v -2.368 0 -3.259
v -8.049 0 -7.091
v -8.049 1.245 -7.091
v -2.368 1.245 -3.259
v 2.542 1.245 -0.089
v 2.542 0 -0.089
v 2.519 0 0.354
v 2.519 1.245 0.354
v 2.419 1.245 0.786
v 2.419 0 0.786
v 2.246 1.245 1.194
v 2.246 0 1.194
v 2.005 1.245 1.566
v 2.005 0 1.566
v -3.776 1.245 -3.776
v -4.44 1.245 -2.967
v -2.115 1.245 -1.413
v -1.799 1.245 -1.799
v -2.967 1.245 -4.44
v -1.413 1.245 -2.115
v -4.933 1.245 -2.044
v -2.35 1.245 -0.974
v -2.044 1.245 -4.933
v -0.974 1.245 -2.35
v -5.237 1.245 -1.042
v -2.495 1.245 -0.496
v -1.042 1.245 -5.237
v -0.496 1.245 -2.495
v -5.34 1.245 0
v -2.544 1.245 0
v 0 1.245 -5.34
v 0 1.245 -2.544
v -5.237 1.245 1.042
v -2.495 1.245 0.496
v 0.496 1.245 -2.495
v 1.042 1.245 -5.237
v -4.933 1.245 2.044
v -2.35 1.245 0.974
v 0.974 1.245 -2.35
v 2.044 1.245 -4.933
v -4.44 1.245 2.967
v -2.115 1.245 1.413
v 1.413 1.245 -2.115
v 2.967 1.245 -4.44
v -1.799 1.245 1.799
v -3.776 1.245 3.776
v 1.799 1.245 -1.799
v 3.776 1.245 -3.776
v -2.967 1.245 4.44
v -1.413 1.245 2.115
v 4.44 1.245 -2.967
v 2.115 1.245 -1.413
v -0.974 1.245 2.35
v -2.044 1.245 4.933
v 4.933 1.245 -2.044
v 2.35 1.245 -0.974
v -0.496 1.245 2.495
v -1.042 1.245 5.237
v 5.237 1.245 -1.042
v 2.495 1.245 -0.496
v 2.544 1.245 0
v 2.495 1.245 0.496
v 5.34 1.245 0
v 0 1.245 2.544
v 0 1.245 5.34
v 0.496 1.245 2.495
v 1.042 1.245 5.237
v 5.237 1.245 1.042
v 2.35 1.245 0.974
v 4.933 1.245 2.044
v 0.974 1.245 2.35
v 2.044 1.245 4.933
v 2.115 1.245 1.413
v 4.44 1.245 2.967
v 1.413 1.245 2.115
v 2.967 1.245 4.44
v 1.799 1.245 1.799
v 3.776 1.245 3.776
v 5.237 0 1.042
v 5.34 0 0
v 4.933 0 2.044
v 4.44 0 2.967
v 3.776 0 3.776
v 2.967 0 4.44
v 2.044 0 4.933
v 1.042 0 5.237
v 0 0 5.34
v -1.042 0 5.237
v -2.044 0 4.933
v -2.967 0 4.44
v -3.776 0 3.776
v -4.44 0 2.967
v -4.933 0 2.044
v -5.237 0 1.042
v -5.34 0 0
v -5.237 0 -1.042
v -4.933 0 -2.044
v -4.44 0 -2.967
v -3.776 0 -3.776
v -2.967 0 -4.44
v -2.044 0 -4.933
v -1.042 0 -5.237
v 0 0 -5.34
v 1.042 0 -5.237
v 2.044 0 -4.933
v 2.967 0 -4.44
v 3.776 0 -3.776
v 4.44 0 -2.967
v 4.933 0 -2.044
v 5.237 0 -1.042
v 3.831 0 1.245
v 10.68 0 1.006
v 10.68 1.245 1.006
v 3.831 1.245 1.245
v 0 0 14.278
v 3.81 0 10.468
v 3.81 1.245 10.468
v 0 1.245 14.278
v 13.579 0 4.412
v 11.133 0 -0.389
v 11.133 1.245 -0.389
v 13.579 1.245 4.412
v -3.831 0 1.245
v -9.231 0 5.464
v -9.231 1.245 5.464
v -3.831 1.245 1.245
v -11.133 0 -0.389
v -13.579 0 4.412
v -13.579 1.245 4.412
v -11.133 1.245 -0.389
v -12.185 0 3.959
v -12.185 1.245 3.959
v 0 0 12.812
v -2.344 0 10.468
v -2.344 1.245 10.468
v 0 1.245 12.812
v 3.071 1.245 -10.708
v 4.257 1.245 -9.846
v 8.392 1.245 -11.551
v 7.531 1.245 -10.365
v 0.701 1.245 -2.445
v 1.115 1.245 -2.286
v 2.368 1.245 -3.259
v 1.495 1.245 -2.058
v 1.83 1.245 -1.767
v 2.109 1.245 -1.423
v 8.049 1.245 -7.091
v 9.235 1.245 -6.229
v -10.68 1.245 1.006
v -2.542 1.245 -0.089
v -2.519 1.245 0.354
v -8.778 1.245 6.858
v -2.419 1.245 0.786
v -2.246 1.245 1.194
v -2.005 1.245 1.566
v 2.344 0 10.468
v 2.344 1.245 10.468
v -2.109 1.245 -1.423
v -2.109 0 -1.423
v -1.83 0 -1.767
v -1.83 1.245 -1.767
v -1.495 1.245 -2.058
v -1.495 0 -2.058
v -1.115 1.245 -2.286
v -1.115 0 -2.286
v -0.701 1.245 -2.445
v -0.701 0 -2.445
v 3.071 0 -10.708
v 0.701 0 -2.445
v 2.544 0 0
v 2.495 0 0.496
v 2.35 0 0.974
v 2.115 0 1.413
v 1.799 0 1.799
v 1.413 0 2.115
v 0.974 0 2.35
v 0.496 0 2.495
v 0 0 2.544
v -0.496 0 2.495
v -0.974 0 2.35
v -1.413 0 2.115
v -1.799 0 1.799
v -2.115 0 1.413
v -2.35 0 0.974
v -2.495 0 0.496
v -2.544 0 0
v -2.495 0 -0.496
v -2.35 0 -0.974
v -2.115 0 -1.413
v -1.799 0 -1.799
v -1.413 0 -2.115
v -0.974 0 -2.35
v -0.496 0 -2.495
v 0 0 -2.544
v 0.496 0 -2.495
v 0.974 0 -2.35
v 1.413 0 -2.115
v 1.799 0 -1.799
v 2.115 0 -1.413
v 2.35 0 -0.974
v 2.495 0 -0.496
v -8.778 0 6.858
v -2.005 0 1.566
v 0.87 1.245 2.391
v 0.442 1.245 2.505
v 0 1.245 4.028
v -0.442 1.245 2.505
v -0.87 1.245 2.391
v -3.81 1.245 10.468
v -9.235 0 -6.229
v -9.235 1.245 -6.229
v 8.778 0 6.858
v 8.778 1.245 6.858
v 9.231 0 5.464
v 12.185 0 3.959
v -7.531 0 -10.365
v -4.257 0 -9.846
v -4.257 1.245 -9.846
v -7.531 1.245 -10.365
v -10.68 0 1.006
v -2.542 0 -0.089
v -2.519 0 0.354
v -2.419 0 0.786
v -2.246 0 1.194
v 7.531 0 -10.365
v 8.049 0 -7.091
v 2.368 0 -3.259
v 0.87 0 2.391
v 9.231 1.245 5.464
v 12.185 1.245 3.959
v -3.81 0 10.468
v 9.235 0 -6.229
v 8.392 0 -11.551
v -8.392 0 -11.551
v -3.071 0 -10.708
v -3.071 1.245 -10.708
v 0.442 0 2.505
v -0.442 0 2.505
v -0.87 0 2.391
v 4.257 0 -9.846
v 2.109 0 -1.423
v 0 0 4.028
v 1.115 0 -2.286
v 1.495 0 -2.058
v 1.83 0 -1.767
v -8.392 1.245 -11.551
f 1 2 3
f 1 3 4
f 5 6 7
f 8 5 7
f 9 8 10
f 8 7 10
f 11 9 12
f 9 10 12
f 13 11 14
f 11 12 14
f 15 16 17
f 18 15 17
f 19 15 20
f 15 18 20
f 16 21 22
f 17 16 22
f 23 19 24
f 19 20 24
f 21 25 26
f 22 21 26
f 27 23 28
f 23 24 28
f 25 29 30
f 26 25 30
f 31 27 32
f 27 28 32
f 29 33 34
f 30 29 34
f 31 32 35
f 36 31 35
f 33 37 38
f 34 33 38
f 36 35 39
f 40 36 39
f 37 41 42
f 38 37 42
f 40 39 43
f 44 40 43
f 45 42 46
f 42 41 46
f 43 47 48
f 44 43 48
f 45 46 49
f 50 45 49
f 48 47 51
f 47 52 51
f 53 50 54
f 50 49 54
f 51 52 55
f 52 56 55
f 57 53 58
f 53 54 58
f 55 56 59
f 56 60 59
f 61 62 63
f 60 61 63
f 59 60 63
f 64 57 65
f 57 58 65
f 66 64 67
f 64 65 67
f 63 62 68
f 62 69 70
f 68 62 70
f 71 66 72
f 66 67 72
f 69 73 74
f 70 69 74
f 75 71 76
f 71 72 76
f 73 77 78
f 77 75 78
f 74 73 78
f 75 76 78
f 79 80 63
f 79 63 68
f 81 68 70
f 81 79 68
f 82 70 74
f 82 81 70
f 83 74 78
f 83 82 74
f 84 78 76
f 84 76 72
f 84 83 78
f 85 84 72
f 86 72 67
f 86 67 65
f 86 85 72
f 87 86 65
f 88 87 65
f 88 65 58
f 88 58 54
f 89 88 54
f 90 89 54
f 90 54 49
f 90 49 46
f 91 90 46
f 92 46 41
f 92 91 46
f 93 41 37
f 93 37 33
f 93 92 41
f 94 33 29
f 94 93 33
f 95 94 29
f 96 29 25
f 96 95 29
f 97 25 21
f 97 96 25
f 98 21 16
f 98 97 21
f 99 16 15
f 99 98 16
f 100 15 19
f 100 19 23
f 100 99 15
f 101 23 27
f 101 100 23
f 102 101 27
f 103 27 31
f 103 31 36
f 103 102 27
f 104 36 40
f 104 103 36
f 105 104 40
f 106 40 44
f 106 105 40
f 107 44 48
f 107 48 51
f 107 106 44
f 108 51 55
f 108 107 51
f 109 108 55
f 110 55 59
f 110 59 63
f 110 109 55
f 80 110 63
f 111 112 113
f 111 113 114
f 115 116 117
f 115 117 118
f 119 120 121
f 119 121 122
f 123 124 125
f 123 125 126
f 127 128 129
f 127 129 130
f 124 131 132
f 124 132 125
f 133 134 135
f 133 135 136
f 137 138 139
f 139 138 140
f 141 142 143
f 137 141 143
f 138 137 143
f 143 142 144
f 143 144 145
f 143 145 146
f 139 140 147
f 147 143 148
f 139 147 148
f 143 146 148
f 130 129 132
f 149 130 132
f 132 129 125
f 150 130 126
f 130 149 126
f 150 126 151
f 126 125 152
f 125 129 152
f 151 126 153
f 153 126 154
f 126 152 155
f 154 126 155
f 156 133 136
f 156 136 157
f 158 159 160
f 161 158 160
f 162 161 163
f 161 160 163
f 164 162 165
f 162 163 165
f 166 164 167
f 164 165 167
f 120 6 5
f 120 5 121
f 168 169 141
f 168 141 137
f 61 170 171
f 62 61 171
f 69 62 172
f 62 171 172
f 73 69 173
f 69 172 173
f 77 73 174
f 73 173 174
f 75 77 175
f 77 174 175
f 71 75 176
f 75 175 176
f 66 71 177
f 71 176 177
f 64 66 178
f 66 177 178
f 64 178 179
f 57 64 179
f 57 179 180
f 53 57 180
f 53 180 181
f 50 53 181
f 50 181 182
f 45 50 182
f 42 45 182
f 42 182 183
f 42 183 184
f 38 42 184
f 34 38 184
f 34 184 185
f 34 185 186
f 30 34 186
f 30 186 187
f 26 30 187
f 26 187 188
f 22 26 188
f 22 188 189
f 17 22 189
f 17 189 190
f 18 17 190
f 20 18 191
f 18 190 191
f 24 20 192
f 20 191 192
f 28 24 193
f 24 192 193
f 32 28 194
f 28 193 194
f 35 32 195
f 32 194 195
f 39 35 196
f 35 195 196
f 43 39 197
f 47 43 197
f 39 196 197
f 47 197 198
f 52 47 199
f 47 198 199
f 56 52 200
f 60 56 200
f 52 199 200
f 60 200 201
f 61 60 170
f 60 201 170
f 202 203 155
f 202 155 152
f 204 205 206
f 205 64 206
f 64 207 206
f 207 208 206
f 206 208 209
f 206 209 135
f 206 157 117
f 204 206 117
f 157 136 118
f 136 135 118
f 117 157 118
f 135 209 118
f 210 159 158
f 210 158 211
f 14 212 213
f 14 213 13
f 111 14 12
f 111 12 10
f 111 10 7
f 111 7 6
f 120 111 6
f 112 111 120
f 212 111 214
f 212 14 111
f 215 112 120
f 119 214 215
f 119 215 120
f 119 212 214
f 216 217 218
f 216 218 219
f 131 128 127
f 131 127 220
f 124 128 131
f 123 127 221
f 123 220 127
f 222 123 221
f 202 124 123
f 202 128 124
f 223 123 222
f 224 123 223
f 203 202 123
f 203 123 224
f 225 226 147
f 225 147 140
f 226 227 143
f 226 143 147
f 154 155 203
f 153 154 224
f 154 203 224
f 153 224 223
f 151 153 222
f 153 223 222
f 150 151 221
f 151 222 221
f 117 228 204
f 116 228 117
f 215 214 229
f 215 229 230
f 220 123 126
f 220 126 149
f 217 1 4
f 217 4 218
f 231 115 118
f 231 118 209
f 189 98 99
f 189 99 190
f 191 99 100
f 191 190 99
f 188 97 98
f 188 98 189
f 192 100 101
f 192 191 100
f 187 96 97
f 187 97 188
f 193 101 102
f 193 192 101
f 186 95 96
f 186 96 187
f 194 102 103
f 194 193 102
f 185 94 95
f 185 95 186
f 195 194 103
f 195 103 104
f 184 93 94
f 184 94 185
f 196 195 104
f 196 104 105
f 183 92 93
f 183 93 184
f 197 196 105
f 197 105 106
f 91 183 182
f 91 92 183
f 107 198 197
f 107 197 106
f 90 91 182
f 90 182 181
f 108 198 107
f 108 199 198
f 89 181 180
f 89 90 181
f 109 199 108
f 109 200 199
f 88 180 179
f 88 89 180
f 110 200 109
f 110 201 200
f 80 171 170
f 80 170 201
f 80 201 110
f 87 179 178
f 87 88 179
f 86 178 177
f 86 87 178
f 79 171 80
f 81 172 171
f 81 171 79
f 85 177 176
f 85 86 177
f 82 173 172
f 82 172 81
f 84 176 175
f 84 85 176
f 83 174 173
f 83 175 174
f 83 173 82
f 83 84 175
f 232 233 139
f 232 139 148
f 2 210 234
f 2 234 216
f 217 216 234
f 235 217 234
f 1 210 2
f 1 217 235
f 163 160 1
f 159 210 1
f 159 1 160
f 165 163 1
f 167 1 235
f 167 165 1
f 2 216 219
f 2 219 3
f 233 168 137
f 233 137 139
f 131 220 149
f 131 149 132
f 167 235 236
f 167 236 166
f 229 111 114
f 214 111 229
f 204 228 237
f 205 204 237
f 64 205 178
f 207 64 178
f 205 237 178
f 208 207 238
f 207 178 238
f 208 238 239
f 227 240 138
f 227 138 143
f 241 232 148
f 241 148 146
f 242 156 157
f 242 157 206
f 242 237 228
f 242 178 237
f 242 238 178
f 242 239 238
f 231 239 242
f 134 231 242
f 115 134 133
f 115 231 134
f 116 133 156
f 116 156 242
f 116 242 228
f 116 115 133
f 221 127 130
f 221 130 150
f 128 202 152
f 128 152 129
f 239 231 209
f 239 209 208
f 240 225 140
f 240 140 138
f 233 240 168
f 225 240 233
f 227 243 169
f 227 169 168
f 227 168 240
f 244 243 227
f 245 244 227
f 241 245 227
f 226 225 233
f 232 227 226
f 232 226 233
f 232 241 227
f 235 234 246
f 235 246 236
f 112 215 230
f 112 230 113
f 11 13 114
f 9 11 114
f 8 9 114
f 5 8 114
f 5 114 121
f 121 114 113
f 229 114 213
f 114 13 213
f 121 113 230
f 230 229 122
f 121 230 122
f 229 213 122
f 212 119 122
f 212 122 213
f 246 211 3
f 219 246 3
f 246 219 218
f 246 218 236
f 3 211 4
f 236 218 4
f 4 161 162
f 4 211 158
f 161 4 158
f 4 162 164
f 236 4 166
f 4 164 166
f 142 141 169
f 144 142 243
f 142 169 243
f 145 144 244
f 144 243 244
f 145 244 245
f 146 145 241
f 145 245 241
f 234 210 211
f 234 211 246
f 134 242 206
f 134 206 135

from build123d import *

# Parameters (mm, degrees)
F1_DEPTH = 1.2446
F2_R     = 5.339968
F3_DEPTH = 1.2446
F4_R     = 2.543919
F5_DEPTH = 1.27


with BuildPart() as f1:
    # F0 (on Front) → F1 (new body)
    with BuildSketch(Plane.XZ):
        Polygon((-3.81, 10.467889), (0, 0), (3.81, 10.467889), (0, 14.277889), align=None)
        Polygon((2.343843, 10.467889), (0, 4.028232), (-2.343843, 10.467889), (0, 12.811732), align=None, mode=Mode.SUBTRACT)
        Polygon((-11.132909, -0.38877), (0, 0), (-8.778199, 6.858281), (-13.579079, 4.41211), align=None)
        Polygon((-9.231267, 5.463883), (-3.831077, 1.244792), (-10.679841, 1.005628), (-12.184682, 3.959043), align=None, mode=Mode.SUBTRACT)
        Polygon((-3.070516, -10.708162), (0, 0), (-9.235226, -6.229238), (-8.392333, -11.551055), align=None)
        Polygon((-8.04908, -7.091024), (-2.367736, -3.258908), (-4.256662, -9.846377), (-7.530547, -10.364909), align=None, mode=Mode.SUBTRACT)
        Polygon((9.235226, -6.229238), (0, 0), (3.070516, -10.708162), (8.392333, -11.551055), align=None)
        Polygon((4.256662, -9.846377), (2.367736, -3.258908), (8.04908, -7.091024), (7.530547, -10.364909), align=None, mode=Mode.SUBTRACT)
        Polygon((8.778199, 6.858281), (0, 0), (11.132909, -0.38877), (13.579079, 4.41211), align=None)
        Polygon((10.679841, 1.005628), (3.831077, 1.244792), (9.231267, 5.463883), (12.184682, 3.959043), align=None, mode=Mode.SUBTRACT)
    extrude(amount=-F1_DEPTH)


with BuildPart() as f3:
    # F2 (on Front) → F3 (new body)
    with BuildSketch(Plane.XZ):
        Circle(F2_R)
    extrude(amount=-F3_DEPTH)


with BuildPart() as f5_tool:
    # F4 (on Front) → F5 (new body)
    with BuildSketch(Plane.XZ):
        Circle(F4_R)
    extrude(amount=-F5_DEPTH)


with BuildPart() as f1_1:
    add(f1.part)

    # F5: cut by f5_tool
    add(f5_tool.part, mode=Mode.SUBTRACT)


with BuildPart() as f3_1:
    add(f3.part)

    # F5: cut by f5_tool
    add(f5_tool.part, mode=Mode.SUBTRACT)


solid = Compound([f1_1.part, f3_1.part])
